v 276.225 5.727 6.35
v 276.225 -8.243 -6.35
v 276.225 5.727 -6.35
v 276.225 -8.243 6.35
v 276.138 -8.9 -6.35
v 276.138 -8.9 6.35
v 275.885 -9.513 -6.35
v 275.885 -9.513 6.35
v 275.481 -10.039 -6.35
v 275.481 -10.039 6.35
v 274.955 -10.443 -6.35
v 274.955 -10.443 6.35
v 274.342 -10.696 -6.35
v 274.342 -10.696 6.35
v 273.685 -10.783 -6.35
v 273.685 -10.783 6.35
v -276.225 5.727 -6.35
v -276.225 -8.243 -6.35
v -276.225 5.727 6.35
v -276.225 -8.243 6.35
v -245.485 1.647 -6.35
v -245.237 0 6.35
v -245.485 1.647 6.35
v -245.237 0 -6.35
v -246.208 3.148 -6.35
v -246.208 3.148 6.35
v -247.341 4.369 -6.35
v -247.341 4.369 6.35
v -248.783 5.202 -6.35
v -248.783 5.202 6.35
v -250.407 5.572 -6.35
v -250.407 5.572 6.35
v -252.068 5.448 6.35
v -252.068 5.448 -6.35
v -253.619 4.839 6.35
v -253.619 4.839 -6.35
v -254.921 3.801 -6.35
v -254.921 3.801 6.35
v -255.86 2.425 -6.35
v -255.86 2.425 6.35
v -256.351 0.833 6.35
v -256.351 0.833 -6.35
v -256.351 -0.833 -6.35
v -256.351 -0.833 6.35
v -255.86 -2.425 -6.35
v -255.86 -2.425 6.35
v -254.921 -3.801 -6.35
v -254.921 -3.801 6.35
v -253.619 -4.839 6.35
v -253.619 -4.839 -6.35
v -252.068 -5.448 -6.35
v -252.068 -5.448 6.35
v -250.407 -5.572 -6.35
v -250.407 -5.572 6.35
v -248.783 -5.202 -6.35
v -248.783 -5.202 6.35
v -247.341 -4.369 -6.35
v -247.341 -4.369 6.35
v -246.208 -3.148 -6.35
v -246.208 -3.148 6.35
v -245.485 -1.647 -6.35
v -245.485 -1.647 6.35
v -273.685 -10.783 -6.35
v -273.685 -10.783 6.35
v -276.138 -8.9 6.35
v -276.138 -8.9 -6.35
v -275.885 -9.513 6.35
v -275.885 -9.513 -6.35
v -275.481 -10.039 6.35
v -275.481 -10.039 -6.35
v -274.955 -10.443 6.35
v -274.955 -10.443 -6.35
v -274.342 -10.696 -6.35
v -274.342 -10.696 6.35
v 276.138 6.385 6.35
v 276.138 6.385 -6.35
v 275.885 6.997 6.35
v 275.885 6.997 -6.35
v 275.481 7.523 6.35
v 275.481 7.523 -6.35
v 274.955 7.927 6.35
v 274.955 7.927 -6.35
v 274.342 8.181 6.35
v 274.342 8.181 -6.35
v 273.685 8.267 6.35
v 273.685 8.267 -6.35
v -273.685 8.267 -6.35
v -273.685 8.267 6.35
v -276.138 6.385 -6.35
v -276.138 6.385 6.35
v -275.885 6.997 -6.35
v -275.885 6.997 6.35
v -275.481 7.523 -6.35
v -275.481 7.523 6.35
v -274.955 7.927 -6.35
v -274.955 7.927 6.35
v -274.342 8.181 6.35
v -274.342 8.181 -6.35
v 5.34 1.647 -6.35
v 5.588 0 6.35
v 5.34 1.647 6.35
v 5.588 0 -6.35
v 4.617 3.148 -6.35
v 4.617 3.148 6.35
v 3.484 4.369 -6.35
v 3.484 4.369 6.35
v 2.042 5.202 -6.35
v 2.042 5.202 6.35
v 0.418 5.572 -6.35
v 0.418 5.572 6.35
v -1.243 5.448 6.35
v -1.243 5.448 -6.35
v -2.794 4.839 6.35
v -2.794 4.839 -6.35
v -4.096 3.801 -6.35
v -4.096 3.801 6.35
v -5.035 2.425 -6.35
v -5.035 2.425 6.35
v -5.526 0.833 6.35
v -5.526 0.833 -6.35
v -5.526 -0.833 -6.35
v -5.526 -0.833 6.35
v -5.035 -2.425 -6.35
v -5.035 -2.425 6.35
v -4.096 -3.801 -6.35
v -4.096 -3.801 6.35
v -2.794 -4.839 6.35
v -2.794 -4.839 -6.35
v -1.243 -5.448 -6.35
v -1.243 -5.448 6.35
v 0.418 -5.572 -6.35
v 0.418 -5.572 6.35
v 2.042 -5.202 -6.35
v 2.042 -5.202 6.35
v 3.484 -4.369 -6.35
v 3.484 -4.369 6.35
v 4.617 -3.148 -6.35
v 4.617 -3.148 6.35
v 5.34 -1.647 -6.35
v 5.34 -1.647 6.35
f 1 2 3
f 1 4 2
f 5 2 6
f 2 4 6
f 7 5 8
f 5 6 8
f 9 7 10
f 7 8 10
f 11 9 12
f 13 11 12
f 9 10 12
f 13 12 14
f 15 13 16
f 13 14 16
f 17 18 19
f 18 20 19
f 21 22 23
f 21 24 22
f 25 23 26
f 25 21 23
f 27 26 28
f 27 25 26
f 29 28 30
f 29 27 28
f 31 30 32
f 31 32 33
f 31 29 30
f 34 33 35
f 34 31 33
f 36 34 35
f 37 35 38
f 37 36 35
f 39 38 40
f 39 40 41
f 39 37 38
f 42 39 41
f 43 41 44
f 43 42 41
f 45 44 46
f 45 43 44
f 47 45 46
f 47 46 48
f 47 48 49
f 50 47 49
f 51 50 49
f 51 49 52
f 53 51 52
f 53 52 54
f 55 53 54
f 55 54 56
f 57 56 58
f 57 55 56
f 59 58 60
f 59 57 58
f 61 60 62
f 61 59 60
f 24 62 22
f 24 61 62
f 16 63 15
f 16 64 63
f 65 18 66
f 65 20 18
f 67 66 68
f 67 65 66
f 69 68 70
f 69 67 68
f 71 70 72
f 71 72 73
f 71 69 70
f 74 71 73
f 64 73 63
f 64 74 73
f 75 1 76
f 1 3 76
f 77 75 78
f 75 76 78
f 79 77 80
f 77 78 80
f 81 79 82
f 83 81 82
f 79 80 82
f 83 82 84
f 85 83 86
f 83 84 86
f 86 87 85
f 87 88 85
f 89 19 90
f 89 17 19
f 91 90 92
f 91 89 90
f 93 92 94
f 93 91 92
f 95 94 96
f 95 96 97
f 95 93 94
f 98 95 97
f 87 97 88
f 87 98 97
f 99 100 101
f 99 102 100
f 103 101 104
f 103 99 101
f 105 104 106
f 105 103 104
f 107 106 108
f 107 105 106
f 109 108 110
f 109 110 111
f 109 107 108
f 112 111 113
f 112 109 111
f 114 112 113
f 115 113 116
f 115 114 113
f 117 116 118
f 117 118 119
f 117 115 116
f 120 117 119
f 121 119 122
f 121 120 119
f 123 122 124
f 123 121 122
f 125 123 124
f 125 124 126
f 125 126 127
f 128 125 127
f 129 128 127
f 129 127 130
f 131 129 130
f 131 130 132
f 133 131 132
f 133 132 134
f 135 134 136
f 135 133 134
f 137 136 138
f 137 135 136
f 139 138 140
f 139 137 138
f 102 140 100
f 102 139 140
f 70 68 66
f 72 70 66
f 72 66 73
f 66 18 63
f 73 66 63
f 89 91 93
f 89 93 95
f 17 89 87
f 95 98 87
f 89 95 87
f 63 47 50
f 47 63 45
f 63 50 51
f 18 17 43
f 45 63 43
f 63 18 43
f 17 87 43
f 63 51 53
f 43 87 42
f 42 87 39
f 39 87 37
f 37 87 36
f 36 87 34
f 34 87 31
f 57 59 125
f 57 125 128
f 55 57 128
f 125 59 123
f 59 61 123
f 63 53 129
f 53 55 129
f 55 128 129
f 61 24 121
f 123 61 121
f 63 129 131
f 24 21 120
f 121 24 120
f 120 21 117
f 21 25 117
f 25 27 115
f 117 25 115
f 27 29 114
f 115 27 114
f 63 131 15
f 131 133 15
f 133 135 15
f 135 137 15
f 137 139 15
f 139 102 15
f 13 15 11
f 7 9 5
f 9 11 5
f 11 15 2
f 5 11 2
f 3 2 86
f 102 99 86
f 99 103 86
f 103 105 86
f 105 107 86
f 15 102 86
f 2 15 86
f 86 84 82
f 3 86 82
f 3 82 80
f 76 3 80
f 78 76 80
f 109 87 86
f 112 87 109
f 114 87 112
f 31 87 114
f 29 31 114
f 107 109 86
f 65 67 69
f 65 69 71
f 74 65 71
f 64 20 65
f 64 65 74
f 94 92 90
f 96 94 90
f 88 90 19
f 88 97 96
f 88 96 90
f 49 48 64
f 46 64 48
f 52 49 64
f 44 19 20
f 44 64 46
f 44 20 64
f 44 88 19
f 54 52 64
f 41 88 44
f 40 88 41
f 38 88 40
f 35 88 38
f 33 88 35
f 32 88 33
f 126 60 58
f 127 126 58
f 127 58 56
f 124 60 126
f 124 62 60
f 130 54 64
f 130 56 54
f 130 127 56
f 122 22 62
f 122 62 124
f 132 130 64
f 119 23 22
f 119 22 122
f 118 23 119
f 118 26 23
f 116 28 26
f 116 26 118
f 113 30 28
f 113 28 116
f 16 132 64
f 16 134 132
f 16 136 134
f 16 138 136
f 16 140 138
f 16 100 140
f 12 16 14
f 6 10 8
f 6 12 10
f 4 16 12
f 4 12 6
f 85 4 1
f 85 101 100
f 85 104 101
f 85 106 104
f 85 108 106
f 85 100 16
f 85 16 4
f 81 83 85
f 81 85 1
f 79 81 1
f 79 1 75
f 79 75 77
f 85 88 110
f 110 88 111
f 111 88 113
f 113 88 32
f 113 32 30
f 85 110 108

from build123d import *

# Parameters (mm, degrees)
SKETCH1_W           = 552.45
SKETCH1_H           = 19.05
SKETCH1_R           = 5.588
BOSS_EXTRUDE1_DEPTH = 6.35
FILLET1_R           = 2.54


with BuildPart() as part:
    # Sketch1 → Boss-Extrude1 (new, symmetric)
    with BuildSketch(Plane.XY):
        with Locations((0, -1.257859134)):
            Rectangle(SKETCH1_W, SKETCH1_H)
        Circle(SKETCH1_R, mode=Mode.SUBTRACT)
        with Locations((-250.825, 0)):
            Circle(SKETCH1_R, mode=Mode.SUBTRACT)
    extrude(amount=BOSS_EXTRUDE1_DEPTH, both=True)

    # Fillet1
    fillet1_edges = [part.edges().sort_by_distance(p)[0] for p in [
        (276.225, -10.782859134, 0),
        (-276.225, -10.782859134, 0),
        (-276.225, 8.267140866, 0),
        (276.225, 8.267140866, 0),
    ]]
    fillet(fillet1_edges, radius=FILLET1_R)


solid = part.part
